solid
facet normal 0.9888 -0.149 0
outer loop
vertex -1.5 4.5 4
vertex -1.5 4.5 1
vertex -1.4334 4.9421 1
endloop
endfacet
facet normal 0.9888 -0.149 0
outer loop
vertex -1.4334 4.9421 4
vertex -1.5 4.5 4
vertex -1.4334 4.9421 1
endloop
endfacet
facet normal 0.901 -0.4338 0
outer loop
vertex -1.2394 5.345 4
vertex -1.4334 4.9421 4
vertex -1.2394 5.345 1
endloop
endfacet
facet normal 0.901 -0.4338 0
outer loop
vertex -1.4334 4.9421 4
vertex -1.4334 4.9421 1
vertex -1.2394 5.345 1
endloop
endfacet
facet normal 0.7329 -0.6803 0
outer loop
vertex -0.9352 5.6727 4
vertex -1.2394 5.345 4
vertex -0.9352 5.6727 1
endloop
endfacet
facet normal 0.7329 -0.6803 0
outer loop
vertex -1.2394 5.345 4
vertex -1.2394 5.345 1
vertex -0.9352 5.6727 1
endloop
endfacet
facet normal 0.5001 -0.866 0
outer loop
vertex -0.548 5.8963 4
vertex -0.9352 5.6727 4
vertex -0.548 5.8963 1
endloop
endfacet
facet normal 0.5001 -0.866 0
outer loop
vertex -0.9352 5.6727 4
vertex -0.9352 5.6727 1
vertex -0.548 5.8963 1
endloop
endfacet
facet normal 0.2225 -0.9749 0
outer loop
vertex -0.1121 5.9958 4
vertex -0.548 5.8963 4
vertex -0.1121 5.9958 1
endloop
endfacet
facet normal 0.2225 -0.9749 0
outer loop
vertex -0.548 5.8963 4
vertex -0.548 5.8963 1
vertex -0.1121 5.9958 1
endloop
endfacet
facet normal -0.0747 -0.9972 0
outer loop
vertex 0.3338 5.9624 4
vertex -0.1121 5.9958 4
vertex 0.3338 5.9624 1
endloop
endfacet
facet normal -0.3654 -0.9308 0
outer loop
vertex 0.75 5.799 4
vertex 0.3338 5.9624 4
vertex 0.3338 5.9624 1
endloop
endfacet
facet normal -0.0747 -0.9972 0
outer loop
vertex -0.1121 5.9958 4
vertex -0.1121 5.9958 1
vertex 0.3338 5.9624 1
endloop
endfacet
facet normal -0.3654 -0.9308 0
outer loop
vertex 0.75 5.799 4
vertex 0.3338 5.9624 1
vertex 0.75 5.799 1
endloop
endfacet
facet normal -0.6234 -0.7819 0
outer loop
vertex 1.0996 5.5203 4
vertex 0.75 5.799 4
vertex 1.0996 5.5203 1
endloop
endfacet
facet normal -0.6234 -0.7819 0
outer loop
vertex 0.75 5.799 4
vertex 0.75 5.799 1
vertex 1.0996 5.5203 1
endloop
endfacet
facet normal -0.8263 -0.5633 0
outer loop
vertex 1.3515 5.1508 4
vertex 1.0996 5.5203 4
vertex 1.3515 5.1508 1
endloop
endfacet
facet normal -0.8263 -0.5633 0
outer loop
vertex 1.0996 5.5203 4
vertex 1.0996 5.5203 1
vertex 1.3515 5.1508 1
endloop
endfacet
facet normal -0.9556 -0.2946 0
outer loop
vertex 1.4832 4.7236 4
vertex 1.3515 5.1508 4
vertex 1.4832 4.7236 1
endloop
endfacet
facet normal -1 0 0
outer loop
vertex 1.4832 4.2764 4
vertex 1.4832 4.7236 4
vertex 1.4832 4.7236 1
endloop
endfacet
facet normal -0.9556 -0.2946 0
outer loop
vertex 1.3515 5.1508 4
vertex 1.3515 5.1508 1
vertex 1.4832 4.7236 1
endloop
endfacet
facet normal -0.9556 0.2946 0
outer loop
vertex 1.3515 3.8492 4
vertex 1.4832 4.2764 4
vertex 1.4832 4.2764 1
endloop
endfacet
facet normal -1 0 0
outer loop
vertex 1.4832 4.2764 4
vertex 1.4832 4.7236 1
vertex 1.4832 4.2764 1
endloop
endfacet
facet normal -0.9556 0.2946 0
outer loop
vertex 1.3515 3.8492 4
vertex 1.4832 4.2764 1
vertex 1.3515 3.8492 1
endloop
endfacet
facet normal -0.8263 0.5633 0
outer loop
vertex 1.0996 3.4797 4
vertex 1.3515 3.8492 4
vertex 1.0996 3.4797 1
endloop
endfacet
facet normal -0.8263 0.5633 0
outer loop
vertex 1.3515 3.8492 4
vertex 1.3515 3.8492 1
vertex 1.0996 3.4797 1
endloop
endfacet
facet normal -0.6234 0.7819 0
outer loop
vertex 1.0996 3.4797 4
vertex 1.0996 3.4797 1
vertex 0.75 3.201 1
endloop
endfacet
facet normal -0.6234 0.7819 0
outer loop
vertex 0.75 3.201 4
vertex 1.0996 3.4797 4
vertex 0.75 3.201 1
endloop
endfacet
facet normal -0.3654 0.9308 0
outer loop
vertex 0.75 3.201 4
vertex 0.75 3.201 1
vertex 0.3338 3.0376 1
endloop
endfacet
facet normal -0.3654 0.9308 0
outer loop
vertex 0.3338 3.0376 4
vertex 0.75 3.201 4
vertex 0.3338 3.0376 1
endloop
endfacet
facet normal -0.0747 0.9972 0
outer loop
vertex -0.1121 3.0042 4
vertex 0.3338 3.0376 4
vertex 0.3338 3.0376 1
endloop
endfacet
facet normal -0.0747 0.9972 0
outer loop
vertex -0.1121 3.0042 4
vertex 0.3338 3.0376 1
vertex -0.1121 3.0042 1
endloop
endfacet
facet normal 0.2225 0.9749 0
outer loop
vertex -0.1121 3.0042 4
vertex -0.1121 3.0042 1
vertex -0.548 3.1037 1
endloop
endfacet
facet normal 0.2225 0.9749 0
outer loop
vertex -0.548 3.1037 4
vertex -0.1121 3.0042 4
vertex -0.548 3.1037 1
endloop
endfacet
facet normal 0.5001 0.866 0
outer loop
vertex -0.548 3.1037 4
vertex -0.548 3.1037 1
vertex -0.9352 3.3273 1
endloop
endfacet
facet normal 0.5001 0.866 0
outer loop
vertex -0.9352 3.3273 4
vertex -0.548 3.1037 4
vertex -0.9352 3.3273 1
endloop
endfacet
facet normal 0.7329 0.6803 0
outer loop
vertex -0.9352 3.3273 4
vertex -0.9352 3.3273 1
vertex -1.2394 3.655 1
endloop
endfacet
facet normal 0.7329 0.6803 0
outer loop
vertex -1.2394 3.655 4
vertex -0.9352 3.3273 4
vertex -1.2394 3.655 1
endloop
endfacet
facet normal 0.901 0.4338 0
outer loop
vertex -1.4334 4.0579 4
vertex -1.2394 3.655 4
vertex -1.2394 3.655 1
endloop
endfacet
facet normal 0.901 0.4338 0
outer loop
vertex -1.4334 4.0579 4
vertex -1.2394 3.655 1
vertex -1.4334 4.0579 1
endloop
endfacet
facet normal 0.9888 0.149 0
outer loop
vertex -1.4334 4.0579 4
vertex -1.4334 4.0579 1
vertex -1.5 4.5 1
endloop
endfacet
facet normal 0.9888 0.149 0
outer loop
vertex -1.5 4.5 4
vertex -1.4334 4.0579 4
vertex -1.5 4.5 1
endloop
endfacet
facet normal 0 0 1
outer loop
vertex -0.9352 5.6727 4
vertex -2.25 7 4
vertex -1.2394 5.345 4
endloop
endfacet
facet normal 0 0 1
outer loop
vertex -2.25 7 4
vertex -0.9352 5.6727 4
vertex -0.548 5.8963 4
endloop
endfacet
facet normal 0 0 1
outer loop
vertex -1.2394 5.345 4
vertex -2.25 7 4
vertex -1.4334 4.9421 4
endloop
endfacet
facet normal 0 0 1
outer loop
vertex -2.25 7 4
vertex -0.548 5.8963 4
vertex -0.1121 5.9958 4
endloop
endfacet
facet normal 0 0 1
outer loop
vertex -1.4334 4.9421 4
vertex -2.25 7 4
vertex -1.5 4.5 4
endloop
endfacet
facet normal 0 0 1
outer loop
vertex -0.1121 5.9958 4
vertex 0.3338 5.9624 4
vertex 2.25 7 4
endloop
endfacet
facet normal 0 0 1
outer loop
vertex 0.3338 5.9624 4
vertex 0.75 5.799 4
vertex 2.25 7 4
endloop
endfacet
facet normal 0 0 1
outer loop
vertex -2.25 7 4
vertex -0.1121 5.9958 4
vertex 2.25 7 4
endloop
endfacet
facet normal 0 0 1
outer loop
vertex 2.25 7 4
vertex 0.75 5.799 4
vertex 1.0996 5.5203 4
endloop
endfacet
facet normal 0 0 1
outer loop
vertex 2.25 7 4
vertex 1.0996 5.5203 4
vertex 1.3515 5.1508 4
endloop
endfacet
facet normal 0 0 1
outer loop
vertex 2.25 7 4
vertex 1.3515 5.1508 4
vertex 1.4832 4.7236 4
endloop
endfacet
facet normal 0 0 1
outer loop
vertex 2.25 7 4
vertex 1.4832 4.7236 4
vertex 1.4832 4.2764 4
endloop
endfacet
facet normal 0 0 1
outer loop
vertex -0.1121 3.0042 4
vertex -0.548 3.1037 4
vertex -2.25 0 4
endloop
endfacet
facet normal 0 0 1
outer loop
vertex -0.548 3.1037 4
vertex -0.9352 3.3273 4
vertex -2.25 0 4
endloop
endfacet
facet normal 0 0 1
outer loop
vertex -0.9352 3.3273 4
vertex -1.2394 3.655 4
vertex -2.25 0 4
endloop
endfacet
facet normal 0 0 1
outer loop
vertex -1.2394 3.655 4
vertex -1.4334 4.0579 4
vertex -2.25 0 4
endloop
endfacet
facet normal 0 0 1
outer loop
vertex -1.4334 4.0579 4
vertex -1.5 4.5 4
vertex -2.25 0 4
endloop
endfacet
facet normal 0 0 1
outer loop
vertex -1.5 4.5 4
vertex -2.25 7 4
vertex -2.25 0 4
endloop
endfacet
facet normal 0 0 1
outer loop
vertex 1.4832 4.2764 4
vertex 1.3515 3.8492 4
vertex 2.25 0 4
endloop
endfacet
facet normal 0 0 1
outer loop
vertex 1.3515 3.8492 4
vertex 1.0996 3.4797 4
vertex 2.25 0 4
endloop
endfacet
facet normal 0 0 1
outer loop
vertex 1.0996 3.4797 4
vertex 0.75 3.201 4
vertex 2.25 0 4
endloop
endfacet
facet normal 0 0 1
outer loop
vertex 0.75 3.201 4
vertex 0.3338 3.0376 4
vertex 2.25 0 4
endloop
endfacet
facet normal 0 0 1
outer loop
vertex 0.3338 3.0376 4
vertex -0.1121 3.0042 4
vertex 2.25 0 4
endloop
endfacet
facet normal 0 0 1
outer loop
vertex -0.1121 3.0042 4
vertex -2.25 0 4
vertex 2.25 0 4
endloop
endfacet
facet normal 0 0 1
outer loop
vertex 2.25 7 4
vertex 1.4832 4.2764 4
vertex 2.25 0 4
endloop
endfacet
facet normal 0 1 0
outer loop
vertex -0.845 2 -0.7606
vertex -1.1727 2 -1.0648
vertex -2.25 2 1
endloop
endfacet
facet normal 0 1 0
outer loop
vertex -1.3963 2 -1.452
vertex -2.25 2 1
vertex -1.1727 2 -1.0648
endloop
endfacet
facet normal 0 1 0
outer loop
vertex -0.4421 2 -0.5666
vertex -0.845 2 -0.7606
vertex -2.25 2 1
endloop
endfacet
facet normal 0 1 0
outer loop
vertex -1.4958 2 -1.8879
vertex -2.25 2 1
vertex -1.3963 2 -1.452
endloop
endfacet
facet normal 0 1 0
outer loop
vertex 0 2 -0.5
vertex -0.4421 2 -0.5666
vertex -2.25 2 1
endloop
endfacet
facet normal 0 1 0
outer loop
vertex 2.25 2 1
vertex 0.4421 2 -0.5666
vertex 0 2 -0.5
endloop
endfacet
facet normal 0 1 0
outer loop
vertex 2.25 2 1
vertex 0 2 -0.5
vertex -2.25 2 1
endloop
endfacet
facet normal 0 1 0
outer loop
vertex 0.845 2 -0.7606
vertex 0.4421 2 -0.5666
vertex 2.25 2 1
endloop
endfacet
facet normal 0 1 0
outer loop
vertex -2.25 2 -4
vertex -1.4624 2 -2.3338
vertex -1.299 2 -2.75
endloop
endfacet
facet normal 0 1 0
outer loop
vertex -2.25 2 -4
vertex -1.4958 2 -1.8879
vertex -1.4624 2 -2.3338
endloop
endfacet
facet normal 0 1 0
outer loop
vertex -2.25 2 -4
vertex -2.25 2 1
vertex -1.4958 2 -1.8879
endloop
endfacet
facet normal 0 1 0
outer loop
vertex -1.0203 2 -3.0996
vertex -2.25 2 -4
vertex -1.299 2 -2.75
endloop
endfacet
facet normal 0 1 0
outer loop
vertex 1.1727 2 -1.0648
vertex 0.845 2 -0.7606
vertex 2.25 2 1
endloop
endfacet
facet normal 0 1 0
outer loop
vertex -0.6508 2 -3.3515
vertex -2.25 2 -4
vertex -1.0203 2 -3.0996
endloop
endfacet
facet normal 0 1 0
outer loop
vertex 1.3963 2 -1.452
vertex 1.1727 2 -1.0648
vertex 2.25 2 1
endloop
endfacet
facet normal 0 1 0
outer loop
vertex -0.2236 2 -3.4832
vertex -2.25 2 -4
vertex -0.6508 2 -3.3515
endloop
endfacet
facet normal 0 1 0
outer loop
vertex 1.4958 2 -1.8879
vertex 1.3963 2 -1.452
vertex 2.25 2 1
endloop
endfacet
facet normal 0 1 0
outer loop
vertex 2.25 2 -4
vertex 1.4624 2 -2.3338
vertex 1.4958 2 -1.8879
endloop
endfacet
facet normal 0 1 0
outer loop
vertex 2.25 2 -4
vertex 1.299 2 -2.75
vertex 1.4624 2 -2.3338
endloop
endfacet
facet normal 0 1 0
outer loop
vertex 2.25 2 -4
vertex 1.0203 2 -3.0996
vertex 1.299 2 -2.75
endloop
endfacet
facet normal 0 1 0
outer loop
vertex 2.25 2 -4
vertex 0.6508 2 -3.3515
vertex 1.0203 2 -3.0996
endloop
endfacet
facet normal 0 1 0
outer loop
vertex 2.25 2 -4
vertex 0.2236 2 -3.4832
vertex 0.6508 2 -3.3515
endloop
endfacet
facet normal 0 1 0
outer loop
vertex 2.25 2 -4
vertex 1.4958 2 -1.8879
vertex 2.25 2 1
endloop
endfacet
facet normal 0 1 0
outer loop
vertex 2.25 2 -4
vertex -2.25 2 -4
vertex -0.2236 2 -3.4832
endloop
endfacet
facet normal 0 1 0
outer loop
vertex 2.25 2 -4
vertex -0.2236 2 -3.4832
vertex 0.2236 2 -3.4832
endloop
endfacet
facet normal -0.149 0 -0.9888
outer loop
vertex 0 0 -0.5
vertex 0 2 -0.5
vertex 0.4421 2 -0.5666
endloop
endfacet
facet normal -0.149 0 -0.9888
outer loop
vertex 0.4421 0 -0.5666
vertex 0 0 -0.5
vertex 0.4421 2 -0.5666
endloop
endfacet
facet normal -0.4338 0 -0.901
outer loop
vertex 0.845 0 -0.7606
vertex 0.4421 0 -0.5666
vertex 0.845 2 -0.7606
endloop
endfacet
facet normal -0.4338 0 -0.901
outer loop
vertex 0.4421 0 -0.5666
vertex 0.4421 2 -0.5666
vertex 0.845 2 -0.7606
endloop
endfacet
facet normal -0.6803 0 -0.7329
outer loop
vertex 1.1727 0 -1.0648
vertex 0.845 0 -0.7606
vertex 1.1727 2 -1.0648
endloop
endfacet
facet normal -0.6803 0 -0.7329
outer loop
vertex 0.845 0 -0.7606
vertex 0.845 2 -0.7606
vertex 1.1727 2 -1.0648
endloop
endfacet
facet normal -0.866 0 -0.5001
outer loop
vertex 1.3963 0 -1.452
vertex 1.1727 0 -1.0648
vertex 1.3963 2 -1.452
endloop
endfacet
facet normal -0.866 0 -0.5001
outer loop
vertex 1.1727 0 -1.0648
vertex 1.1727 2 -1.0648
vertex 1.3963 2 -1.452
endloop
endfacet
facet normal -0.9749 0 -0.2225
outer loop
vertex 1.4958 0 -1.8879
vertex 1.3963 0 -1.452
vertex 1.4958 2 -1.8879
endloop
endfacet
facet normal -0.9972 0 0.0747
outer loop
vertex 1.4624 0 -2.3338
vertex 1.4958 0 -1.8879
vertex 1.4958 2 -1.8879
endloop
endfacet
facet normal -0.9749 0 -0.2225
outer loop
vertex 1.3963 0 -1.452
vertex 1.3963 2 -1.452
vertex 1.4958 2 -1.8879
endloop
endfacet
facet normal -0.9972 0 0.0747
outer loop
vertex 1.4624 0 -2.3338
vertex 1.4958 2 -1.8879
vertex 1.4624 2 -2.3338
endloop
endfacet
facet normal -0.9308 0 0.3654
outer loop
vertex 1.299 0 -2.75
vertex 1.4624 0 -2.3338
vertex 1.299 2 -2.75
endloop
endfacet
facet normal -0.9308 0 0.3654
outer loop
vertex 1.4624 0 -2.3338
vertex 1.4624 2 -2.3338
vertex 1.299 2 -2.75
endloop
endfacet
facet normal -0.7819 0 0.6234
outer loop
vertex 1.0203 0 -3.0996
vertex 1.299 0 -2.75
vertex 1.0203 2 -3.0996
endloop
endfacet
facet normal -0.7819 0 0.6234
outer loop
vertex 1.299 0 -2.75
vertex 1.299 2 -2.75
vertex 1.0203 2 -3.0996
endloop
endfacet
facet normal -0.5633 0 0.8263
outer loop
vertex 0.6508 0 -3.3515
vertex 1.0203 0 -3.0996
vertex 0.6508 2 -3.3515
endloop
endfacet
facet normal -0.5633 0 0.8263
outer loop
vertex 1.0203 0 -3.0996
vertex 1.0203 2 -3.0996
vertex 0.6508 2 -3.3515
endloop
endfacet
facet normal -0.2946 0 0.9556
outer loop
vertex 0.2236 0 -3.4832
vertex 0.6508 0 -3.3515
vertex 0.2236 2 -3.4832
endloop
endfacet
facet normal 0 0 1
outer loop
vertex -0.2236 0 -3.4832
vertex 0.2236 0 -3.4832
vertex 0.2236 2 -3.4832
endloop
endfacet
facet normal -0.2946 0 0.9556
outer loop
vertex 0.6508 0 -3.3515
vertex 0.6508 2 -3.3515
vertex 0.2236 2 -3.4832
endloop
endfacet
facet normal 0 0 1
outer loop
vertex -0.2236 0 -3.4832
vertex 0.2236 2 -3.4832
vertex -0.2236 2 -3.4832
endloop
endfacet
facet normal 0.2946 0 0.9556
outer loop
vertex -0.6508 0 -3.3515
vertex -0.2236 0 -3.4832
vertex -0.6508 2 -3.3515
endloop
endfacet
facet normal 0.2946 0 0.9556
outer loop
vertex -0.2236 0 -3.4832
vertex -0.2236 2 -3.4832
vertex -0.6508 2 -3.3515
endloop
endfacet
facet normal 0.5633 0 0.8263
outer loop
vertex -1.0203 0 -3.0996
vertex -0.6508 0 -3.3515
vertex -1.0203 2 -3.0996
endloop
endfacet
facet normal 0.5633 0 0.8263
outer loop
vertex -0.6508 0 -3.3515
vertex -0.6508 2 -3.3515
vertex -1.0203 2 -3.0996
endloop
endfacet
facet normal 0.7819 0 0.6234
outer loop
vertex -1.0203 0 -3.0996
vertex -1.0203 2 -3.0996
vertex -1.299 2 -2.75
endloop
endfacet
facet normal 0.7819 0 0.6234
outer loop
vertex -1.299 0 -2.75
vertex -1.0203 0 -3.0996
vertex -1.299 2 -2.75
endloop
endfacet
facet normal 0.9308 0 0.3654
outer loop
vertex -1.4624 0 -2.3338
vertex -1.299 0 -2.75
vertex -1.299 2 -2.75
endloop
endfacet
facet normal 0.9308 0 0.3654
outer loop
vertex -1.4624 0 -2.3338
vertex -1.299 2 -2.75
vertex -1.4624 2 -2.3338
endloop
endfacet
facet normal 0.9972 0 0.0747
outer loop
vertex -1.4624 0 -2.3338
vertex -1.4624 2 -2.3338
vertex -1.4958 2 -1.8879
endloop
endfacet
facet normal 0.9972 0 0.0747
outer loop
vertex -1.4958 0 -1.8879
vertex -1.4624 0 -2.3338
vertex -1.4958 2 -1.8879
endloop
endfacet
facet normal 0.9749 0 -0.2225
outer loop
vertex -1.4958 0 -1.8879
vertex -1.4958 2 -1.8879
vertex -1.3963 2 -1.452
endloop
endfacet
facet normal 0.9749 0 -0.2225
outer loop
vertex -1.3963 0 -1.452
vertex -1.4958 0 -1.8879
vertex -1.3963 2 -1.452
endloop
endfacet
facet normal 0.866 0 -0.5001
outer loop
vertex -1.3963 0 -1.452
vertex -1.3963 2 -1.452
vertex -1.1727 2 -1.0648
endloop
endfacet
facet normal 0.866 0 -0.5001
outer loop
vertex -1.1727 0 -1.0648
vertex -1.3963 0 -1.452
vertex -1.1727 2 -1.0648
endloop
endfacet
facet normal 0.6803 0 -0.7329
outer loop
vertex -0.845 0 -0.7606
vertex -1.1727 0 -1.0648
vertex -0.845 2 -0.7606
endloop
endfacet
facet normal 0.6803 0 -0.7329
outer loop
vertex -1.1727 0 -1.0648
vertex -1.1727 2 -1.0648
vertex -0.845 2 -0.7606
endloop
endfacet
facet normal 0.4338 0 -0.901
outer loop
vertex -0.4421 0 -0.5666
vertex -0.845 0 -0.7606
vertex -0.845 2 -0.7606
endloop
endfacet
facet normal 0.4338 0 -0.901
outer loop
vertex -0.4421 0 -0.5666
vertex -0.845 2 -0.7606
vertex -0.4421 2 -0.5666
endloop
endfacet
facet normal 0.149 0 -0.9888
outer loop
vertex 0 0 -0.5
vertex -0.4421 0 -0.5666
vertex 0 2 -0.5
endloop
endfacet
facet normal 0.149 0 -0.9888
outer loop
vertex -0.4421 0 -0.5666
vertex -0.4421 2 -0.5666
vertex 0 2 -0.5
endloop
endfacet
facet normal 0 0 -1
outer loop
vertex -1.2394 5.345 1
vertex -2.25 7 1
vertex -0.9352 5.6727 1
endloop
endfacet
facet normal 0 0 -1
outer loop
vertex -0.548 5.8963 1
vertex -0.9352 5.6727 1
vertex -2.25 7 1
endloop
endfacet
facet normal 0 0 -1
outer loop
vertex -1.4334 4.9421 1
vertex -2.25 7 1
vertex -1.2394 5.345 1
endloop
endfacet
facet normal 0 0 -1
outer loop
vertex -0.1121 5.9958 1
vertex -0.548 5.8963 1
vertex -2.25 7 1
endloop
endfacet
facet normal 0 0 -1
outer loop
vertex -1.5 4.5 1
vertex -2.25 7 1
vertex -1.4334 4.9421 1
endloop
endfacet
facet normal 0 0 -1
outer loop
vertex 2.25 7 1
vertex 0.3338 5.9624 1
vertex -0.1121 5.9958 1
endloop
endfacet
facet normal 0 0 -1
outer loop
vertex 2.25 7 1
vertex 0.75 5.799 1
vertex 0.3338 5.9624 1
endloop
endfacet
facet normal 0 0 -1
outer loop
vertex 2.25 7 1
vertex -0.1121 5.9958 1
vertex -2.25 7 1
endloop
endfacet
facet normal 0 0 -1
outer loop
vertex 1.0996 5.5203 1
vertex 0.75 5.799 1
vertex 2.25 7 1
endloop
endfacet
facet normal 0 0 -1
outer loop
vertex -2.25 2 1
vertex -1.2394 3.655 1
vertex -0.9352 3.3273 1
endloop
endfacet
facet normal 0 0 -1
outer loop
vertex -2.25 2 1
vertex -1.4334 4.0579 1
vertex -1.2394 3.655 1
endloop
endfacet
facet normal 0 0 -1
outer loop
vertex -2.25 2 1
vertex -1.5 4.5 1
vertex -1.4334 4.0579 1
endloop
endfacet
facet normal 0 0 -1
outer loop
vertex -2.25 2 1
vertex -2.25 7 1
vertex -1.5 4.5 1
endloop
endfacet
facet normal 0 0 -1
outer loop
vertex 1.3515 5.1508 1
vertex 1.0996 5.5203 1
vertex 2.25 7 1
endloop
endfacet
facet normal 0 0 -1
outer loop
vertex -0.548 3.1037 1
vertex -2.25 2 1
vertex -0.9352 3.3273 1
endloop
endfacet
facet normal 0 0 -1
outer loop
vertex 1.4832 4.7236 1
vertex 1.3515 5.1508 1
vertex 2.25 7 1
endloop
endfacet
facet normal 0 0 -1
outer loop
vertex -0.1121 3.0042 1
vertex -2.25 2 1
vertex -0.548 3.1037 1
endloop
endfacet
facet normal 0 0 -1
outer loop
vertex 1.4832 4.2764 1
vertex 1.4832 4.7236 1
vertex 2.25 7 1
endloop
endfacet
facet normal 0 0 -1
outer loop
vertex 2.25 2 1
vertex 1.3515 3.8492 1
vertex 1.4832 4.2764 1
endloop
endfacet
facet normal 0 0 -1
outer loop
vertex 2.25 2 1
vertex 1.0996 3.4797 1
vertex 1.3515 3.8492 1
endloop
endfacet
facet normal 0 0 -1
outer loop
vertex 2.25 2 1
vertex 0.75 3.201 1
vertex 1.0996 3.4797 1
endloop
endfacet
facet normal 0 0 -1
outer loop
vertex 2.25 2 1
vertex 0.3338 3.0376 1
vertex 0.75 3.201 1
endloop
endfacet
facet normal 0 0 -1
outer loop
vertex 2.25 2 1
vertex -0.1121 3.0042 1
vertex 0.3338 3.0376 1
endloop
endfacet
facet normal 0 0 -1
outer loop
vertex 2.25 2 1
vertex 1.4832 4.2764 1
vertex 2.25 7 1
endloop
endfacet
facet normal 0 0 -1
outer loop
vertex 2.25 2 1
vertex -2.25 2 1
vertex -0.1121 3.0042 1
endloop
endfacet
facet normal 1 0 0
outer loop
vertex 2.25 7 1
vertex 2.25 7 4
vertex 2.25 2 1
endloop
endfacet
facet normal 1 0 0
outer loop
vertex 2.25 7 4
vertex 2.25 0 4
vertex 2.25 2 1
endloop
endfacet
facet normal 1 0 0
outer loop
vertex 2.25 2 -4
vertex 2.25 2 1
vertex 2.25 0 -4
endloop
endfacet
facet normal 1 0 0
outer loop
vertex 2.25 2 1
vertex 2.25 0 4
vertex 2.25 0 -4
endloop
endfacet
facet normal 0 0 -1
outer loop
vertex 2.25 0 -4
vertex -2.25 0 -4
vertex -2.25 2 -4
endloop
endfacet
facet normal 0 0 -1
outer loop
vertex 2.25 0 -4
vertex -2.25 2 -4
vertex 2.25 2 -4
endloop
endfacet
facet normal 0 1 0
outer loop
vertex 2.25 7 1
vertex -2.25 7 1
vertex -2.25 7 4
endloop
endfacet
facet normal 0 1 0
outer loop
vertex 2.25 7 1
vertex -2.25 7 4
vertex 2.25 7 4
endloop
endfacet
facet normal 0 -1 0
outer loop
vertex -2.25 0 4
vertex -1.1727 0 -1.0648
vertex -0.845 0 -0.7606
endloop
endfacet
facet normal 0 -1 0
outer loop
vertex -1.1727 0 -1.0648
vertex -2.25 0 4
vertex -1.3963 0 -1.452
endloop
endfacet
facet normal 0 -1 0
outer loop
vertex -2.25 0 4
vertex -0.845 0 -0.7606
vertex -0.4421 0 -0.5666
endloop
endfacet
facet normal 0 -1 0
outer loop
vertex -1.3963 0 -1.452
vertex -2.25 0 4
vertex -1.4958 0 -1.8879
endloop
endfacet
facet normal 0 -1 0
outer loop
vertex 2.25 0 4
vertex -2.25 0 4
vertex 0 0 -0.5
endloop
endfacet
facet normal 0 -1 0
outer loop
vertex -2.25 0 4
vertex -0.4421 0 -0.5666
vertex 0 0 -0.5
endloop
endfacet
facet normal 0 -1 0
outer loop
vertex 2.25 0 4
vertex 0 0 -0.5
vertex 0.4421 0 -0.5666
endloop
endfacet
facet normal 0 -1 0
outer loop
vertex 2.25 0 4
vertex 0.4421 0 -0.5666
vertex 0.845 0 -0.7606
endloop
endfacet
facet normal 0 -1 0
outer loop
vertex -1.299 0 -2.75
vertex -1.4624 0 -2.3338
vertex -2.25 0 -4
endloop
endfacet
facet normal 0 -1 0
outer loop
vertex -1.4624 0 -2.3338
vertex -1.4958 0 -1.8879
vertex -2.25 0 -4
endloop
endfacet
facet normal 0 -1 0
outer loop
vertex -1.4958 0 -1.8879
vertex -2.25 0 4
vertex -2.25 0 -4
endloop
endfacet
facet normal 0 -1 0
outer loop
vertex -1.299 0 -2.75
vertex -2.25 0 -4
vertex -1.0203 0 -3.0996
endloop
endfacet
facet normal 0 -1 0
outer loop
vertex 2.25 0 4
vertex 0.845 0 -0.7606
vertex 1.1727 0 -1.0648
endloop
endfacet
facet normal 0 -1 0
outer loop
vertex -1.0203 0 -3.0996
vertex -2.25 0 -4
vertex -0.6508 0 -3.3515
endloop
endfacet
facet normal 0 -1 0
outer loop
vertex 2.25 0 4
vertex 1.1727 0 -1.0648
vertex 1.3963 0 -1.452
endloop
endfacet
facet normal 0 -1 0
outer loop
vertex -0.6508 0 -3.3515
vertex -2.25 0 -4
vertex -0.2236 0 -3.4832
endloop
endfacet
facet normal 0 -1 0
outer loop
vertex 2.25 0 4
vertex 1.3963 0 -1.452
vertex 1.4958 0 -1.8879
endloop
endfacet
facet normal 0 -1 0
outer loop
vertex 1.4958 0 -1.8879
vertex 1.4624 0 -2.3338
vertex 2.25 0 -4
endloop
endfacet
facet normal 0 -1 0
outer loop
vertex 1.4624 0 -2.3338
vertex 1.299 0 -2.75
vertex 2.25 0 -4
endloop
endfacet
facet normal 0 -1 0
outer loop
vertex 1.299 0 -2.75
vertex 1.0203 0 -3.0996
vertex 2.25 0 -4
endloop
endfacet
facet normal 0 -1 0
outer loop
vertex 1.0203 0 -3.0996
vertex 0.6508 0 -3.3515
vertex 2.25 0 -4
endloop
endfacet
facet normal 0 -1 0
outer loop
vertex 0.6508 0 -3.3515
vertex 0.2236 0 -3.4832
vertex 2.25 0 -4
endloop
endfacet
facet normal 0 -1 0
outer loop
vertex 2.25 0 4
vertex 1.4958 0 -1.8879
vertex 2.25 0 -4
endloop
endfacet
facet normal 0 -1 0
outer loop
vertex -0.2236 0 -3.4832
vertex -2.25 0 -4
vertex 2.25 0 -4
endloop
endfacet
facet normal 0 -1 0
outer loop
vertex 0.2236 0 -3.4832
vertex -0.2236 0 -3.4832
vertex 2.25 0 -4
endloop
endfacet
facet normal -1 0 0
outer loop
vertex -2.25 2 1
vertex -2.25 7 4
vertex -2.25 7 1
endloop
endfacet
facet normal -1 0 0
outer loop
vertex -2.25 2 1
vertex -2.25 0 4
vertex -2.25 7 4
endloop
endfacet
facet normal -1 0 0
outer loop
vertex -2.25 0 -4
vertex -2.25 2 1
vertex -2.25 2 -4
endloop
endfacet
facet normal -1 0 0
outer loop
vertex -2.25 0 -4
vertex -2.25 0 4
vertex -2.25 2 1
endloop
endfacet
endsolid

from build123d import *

# Parameters (mm, degrees)
SKETCH1_W           = 4.5
SKETCH1_H           = 8
BOSS_EXTRUDE1_DEPTH = 2
SKETCH2_R           = 1.5
CUT_EXTRUDE1_DEPTH  = 2
SKETCH3_W           = 4.5
SKETCH3_H           = 3
BOSS_EXTRUDE2_DEPTH = 5
SKETCH4_R           = 1.5
CUT_EXTRUDE2_DEPTH  = 5


with BuildPart() as part:
    # Sketch1 → Boss-Extrude1 (new body)
    with BuildSketch(Plane(origin=(0, 0, 0), x_dir=(1, 0, 0), z_dir=(0, 1, 0))):
        Rectangle(SKETCH1_W, SKETCH1_H)
    extrude(amount=BOSS_EXTRUDE1_DEPTH)

    # Sketch2 → Cut-Extrude1 (cut)
    with BuildSketch(Plane(origin=(0, 2, 0), x_dir=(1, 0, 0), z_dir=(0, 1, 0))):
        with Locations(Location((0, 2, 0), (0, 0, 270))):
            Circle(SKETCH2_R)
    extrude(amount=-CUT_EXTRUDE1_DEPTH, mode=Mode.SUBTRACT)

    # Sketch3 → Boss-Extrude2 (add)
    with BuildSketch(Plane(origin=(0, 2, 0), x_dir=(1, 0, 0), z_dir=(0, 1, 0))):
        with Locations((0, -2.5)):
            Rectangle(SKETCH3_W, SKETCH3_H)
    extrude(amount=BOSS_EXTRUDE2_DEPTH)

    # Sketch4 → Cut-Extrude2 (cut)
    with BuildSketch(Plane(origin=(0, 0, 1), x_dir=(-1, 0, 0), z_dir=(0, 0, -1))):
        with Locations((0, 4.5)):
            Circle(SKETCH4_R)
    extrude(amount=-CUT_EXTRUDE2_DEPTH, mode=Mode.SUBTRACT)


solid = part.part
